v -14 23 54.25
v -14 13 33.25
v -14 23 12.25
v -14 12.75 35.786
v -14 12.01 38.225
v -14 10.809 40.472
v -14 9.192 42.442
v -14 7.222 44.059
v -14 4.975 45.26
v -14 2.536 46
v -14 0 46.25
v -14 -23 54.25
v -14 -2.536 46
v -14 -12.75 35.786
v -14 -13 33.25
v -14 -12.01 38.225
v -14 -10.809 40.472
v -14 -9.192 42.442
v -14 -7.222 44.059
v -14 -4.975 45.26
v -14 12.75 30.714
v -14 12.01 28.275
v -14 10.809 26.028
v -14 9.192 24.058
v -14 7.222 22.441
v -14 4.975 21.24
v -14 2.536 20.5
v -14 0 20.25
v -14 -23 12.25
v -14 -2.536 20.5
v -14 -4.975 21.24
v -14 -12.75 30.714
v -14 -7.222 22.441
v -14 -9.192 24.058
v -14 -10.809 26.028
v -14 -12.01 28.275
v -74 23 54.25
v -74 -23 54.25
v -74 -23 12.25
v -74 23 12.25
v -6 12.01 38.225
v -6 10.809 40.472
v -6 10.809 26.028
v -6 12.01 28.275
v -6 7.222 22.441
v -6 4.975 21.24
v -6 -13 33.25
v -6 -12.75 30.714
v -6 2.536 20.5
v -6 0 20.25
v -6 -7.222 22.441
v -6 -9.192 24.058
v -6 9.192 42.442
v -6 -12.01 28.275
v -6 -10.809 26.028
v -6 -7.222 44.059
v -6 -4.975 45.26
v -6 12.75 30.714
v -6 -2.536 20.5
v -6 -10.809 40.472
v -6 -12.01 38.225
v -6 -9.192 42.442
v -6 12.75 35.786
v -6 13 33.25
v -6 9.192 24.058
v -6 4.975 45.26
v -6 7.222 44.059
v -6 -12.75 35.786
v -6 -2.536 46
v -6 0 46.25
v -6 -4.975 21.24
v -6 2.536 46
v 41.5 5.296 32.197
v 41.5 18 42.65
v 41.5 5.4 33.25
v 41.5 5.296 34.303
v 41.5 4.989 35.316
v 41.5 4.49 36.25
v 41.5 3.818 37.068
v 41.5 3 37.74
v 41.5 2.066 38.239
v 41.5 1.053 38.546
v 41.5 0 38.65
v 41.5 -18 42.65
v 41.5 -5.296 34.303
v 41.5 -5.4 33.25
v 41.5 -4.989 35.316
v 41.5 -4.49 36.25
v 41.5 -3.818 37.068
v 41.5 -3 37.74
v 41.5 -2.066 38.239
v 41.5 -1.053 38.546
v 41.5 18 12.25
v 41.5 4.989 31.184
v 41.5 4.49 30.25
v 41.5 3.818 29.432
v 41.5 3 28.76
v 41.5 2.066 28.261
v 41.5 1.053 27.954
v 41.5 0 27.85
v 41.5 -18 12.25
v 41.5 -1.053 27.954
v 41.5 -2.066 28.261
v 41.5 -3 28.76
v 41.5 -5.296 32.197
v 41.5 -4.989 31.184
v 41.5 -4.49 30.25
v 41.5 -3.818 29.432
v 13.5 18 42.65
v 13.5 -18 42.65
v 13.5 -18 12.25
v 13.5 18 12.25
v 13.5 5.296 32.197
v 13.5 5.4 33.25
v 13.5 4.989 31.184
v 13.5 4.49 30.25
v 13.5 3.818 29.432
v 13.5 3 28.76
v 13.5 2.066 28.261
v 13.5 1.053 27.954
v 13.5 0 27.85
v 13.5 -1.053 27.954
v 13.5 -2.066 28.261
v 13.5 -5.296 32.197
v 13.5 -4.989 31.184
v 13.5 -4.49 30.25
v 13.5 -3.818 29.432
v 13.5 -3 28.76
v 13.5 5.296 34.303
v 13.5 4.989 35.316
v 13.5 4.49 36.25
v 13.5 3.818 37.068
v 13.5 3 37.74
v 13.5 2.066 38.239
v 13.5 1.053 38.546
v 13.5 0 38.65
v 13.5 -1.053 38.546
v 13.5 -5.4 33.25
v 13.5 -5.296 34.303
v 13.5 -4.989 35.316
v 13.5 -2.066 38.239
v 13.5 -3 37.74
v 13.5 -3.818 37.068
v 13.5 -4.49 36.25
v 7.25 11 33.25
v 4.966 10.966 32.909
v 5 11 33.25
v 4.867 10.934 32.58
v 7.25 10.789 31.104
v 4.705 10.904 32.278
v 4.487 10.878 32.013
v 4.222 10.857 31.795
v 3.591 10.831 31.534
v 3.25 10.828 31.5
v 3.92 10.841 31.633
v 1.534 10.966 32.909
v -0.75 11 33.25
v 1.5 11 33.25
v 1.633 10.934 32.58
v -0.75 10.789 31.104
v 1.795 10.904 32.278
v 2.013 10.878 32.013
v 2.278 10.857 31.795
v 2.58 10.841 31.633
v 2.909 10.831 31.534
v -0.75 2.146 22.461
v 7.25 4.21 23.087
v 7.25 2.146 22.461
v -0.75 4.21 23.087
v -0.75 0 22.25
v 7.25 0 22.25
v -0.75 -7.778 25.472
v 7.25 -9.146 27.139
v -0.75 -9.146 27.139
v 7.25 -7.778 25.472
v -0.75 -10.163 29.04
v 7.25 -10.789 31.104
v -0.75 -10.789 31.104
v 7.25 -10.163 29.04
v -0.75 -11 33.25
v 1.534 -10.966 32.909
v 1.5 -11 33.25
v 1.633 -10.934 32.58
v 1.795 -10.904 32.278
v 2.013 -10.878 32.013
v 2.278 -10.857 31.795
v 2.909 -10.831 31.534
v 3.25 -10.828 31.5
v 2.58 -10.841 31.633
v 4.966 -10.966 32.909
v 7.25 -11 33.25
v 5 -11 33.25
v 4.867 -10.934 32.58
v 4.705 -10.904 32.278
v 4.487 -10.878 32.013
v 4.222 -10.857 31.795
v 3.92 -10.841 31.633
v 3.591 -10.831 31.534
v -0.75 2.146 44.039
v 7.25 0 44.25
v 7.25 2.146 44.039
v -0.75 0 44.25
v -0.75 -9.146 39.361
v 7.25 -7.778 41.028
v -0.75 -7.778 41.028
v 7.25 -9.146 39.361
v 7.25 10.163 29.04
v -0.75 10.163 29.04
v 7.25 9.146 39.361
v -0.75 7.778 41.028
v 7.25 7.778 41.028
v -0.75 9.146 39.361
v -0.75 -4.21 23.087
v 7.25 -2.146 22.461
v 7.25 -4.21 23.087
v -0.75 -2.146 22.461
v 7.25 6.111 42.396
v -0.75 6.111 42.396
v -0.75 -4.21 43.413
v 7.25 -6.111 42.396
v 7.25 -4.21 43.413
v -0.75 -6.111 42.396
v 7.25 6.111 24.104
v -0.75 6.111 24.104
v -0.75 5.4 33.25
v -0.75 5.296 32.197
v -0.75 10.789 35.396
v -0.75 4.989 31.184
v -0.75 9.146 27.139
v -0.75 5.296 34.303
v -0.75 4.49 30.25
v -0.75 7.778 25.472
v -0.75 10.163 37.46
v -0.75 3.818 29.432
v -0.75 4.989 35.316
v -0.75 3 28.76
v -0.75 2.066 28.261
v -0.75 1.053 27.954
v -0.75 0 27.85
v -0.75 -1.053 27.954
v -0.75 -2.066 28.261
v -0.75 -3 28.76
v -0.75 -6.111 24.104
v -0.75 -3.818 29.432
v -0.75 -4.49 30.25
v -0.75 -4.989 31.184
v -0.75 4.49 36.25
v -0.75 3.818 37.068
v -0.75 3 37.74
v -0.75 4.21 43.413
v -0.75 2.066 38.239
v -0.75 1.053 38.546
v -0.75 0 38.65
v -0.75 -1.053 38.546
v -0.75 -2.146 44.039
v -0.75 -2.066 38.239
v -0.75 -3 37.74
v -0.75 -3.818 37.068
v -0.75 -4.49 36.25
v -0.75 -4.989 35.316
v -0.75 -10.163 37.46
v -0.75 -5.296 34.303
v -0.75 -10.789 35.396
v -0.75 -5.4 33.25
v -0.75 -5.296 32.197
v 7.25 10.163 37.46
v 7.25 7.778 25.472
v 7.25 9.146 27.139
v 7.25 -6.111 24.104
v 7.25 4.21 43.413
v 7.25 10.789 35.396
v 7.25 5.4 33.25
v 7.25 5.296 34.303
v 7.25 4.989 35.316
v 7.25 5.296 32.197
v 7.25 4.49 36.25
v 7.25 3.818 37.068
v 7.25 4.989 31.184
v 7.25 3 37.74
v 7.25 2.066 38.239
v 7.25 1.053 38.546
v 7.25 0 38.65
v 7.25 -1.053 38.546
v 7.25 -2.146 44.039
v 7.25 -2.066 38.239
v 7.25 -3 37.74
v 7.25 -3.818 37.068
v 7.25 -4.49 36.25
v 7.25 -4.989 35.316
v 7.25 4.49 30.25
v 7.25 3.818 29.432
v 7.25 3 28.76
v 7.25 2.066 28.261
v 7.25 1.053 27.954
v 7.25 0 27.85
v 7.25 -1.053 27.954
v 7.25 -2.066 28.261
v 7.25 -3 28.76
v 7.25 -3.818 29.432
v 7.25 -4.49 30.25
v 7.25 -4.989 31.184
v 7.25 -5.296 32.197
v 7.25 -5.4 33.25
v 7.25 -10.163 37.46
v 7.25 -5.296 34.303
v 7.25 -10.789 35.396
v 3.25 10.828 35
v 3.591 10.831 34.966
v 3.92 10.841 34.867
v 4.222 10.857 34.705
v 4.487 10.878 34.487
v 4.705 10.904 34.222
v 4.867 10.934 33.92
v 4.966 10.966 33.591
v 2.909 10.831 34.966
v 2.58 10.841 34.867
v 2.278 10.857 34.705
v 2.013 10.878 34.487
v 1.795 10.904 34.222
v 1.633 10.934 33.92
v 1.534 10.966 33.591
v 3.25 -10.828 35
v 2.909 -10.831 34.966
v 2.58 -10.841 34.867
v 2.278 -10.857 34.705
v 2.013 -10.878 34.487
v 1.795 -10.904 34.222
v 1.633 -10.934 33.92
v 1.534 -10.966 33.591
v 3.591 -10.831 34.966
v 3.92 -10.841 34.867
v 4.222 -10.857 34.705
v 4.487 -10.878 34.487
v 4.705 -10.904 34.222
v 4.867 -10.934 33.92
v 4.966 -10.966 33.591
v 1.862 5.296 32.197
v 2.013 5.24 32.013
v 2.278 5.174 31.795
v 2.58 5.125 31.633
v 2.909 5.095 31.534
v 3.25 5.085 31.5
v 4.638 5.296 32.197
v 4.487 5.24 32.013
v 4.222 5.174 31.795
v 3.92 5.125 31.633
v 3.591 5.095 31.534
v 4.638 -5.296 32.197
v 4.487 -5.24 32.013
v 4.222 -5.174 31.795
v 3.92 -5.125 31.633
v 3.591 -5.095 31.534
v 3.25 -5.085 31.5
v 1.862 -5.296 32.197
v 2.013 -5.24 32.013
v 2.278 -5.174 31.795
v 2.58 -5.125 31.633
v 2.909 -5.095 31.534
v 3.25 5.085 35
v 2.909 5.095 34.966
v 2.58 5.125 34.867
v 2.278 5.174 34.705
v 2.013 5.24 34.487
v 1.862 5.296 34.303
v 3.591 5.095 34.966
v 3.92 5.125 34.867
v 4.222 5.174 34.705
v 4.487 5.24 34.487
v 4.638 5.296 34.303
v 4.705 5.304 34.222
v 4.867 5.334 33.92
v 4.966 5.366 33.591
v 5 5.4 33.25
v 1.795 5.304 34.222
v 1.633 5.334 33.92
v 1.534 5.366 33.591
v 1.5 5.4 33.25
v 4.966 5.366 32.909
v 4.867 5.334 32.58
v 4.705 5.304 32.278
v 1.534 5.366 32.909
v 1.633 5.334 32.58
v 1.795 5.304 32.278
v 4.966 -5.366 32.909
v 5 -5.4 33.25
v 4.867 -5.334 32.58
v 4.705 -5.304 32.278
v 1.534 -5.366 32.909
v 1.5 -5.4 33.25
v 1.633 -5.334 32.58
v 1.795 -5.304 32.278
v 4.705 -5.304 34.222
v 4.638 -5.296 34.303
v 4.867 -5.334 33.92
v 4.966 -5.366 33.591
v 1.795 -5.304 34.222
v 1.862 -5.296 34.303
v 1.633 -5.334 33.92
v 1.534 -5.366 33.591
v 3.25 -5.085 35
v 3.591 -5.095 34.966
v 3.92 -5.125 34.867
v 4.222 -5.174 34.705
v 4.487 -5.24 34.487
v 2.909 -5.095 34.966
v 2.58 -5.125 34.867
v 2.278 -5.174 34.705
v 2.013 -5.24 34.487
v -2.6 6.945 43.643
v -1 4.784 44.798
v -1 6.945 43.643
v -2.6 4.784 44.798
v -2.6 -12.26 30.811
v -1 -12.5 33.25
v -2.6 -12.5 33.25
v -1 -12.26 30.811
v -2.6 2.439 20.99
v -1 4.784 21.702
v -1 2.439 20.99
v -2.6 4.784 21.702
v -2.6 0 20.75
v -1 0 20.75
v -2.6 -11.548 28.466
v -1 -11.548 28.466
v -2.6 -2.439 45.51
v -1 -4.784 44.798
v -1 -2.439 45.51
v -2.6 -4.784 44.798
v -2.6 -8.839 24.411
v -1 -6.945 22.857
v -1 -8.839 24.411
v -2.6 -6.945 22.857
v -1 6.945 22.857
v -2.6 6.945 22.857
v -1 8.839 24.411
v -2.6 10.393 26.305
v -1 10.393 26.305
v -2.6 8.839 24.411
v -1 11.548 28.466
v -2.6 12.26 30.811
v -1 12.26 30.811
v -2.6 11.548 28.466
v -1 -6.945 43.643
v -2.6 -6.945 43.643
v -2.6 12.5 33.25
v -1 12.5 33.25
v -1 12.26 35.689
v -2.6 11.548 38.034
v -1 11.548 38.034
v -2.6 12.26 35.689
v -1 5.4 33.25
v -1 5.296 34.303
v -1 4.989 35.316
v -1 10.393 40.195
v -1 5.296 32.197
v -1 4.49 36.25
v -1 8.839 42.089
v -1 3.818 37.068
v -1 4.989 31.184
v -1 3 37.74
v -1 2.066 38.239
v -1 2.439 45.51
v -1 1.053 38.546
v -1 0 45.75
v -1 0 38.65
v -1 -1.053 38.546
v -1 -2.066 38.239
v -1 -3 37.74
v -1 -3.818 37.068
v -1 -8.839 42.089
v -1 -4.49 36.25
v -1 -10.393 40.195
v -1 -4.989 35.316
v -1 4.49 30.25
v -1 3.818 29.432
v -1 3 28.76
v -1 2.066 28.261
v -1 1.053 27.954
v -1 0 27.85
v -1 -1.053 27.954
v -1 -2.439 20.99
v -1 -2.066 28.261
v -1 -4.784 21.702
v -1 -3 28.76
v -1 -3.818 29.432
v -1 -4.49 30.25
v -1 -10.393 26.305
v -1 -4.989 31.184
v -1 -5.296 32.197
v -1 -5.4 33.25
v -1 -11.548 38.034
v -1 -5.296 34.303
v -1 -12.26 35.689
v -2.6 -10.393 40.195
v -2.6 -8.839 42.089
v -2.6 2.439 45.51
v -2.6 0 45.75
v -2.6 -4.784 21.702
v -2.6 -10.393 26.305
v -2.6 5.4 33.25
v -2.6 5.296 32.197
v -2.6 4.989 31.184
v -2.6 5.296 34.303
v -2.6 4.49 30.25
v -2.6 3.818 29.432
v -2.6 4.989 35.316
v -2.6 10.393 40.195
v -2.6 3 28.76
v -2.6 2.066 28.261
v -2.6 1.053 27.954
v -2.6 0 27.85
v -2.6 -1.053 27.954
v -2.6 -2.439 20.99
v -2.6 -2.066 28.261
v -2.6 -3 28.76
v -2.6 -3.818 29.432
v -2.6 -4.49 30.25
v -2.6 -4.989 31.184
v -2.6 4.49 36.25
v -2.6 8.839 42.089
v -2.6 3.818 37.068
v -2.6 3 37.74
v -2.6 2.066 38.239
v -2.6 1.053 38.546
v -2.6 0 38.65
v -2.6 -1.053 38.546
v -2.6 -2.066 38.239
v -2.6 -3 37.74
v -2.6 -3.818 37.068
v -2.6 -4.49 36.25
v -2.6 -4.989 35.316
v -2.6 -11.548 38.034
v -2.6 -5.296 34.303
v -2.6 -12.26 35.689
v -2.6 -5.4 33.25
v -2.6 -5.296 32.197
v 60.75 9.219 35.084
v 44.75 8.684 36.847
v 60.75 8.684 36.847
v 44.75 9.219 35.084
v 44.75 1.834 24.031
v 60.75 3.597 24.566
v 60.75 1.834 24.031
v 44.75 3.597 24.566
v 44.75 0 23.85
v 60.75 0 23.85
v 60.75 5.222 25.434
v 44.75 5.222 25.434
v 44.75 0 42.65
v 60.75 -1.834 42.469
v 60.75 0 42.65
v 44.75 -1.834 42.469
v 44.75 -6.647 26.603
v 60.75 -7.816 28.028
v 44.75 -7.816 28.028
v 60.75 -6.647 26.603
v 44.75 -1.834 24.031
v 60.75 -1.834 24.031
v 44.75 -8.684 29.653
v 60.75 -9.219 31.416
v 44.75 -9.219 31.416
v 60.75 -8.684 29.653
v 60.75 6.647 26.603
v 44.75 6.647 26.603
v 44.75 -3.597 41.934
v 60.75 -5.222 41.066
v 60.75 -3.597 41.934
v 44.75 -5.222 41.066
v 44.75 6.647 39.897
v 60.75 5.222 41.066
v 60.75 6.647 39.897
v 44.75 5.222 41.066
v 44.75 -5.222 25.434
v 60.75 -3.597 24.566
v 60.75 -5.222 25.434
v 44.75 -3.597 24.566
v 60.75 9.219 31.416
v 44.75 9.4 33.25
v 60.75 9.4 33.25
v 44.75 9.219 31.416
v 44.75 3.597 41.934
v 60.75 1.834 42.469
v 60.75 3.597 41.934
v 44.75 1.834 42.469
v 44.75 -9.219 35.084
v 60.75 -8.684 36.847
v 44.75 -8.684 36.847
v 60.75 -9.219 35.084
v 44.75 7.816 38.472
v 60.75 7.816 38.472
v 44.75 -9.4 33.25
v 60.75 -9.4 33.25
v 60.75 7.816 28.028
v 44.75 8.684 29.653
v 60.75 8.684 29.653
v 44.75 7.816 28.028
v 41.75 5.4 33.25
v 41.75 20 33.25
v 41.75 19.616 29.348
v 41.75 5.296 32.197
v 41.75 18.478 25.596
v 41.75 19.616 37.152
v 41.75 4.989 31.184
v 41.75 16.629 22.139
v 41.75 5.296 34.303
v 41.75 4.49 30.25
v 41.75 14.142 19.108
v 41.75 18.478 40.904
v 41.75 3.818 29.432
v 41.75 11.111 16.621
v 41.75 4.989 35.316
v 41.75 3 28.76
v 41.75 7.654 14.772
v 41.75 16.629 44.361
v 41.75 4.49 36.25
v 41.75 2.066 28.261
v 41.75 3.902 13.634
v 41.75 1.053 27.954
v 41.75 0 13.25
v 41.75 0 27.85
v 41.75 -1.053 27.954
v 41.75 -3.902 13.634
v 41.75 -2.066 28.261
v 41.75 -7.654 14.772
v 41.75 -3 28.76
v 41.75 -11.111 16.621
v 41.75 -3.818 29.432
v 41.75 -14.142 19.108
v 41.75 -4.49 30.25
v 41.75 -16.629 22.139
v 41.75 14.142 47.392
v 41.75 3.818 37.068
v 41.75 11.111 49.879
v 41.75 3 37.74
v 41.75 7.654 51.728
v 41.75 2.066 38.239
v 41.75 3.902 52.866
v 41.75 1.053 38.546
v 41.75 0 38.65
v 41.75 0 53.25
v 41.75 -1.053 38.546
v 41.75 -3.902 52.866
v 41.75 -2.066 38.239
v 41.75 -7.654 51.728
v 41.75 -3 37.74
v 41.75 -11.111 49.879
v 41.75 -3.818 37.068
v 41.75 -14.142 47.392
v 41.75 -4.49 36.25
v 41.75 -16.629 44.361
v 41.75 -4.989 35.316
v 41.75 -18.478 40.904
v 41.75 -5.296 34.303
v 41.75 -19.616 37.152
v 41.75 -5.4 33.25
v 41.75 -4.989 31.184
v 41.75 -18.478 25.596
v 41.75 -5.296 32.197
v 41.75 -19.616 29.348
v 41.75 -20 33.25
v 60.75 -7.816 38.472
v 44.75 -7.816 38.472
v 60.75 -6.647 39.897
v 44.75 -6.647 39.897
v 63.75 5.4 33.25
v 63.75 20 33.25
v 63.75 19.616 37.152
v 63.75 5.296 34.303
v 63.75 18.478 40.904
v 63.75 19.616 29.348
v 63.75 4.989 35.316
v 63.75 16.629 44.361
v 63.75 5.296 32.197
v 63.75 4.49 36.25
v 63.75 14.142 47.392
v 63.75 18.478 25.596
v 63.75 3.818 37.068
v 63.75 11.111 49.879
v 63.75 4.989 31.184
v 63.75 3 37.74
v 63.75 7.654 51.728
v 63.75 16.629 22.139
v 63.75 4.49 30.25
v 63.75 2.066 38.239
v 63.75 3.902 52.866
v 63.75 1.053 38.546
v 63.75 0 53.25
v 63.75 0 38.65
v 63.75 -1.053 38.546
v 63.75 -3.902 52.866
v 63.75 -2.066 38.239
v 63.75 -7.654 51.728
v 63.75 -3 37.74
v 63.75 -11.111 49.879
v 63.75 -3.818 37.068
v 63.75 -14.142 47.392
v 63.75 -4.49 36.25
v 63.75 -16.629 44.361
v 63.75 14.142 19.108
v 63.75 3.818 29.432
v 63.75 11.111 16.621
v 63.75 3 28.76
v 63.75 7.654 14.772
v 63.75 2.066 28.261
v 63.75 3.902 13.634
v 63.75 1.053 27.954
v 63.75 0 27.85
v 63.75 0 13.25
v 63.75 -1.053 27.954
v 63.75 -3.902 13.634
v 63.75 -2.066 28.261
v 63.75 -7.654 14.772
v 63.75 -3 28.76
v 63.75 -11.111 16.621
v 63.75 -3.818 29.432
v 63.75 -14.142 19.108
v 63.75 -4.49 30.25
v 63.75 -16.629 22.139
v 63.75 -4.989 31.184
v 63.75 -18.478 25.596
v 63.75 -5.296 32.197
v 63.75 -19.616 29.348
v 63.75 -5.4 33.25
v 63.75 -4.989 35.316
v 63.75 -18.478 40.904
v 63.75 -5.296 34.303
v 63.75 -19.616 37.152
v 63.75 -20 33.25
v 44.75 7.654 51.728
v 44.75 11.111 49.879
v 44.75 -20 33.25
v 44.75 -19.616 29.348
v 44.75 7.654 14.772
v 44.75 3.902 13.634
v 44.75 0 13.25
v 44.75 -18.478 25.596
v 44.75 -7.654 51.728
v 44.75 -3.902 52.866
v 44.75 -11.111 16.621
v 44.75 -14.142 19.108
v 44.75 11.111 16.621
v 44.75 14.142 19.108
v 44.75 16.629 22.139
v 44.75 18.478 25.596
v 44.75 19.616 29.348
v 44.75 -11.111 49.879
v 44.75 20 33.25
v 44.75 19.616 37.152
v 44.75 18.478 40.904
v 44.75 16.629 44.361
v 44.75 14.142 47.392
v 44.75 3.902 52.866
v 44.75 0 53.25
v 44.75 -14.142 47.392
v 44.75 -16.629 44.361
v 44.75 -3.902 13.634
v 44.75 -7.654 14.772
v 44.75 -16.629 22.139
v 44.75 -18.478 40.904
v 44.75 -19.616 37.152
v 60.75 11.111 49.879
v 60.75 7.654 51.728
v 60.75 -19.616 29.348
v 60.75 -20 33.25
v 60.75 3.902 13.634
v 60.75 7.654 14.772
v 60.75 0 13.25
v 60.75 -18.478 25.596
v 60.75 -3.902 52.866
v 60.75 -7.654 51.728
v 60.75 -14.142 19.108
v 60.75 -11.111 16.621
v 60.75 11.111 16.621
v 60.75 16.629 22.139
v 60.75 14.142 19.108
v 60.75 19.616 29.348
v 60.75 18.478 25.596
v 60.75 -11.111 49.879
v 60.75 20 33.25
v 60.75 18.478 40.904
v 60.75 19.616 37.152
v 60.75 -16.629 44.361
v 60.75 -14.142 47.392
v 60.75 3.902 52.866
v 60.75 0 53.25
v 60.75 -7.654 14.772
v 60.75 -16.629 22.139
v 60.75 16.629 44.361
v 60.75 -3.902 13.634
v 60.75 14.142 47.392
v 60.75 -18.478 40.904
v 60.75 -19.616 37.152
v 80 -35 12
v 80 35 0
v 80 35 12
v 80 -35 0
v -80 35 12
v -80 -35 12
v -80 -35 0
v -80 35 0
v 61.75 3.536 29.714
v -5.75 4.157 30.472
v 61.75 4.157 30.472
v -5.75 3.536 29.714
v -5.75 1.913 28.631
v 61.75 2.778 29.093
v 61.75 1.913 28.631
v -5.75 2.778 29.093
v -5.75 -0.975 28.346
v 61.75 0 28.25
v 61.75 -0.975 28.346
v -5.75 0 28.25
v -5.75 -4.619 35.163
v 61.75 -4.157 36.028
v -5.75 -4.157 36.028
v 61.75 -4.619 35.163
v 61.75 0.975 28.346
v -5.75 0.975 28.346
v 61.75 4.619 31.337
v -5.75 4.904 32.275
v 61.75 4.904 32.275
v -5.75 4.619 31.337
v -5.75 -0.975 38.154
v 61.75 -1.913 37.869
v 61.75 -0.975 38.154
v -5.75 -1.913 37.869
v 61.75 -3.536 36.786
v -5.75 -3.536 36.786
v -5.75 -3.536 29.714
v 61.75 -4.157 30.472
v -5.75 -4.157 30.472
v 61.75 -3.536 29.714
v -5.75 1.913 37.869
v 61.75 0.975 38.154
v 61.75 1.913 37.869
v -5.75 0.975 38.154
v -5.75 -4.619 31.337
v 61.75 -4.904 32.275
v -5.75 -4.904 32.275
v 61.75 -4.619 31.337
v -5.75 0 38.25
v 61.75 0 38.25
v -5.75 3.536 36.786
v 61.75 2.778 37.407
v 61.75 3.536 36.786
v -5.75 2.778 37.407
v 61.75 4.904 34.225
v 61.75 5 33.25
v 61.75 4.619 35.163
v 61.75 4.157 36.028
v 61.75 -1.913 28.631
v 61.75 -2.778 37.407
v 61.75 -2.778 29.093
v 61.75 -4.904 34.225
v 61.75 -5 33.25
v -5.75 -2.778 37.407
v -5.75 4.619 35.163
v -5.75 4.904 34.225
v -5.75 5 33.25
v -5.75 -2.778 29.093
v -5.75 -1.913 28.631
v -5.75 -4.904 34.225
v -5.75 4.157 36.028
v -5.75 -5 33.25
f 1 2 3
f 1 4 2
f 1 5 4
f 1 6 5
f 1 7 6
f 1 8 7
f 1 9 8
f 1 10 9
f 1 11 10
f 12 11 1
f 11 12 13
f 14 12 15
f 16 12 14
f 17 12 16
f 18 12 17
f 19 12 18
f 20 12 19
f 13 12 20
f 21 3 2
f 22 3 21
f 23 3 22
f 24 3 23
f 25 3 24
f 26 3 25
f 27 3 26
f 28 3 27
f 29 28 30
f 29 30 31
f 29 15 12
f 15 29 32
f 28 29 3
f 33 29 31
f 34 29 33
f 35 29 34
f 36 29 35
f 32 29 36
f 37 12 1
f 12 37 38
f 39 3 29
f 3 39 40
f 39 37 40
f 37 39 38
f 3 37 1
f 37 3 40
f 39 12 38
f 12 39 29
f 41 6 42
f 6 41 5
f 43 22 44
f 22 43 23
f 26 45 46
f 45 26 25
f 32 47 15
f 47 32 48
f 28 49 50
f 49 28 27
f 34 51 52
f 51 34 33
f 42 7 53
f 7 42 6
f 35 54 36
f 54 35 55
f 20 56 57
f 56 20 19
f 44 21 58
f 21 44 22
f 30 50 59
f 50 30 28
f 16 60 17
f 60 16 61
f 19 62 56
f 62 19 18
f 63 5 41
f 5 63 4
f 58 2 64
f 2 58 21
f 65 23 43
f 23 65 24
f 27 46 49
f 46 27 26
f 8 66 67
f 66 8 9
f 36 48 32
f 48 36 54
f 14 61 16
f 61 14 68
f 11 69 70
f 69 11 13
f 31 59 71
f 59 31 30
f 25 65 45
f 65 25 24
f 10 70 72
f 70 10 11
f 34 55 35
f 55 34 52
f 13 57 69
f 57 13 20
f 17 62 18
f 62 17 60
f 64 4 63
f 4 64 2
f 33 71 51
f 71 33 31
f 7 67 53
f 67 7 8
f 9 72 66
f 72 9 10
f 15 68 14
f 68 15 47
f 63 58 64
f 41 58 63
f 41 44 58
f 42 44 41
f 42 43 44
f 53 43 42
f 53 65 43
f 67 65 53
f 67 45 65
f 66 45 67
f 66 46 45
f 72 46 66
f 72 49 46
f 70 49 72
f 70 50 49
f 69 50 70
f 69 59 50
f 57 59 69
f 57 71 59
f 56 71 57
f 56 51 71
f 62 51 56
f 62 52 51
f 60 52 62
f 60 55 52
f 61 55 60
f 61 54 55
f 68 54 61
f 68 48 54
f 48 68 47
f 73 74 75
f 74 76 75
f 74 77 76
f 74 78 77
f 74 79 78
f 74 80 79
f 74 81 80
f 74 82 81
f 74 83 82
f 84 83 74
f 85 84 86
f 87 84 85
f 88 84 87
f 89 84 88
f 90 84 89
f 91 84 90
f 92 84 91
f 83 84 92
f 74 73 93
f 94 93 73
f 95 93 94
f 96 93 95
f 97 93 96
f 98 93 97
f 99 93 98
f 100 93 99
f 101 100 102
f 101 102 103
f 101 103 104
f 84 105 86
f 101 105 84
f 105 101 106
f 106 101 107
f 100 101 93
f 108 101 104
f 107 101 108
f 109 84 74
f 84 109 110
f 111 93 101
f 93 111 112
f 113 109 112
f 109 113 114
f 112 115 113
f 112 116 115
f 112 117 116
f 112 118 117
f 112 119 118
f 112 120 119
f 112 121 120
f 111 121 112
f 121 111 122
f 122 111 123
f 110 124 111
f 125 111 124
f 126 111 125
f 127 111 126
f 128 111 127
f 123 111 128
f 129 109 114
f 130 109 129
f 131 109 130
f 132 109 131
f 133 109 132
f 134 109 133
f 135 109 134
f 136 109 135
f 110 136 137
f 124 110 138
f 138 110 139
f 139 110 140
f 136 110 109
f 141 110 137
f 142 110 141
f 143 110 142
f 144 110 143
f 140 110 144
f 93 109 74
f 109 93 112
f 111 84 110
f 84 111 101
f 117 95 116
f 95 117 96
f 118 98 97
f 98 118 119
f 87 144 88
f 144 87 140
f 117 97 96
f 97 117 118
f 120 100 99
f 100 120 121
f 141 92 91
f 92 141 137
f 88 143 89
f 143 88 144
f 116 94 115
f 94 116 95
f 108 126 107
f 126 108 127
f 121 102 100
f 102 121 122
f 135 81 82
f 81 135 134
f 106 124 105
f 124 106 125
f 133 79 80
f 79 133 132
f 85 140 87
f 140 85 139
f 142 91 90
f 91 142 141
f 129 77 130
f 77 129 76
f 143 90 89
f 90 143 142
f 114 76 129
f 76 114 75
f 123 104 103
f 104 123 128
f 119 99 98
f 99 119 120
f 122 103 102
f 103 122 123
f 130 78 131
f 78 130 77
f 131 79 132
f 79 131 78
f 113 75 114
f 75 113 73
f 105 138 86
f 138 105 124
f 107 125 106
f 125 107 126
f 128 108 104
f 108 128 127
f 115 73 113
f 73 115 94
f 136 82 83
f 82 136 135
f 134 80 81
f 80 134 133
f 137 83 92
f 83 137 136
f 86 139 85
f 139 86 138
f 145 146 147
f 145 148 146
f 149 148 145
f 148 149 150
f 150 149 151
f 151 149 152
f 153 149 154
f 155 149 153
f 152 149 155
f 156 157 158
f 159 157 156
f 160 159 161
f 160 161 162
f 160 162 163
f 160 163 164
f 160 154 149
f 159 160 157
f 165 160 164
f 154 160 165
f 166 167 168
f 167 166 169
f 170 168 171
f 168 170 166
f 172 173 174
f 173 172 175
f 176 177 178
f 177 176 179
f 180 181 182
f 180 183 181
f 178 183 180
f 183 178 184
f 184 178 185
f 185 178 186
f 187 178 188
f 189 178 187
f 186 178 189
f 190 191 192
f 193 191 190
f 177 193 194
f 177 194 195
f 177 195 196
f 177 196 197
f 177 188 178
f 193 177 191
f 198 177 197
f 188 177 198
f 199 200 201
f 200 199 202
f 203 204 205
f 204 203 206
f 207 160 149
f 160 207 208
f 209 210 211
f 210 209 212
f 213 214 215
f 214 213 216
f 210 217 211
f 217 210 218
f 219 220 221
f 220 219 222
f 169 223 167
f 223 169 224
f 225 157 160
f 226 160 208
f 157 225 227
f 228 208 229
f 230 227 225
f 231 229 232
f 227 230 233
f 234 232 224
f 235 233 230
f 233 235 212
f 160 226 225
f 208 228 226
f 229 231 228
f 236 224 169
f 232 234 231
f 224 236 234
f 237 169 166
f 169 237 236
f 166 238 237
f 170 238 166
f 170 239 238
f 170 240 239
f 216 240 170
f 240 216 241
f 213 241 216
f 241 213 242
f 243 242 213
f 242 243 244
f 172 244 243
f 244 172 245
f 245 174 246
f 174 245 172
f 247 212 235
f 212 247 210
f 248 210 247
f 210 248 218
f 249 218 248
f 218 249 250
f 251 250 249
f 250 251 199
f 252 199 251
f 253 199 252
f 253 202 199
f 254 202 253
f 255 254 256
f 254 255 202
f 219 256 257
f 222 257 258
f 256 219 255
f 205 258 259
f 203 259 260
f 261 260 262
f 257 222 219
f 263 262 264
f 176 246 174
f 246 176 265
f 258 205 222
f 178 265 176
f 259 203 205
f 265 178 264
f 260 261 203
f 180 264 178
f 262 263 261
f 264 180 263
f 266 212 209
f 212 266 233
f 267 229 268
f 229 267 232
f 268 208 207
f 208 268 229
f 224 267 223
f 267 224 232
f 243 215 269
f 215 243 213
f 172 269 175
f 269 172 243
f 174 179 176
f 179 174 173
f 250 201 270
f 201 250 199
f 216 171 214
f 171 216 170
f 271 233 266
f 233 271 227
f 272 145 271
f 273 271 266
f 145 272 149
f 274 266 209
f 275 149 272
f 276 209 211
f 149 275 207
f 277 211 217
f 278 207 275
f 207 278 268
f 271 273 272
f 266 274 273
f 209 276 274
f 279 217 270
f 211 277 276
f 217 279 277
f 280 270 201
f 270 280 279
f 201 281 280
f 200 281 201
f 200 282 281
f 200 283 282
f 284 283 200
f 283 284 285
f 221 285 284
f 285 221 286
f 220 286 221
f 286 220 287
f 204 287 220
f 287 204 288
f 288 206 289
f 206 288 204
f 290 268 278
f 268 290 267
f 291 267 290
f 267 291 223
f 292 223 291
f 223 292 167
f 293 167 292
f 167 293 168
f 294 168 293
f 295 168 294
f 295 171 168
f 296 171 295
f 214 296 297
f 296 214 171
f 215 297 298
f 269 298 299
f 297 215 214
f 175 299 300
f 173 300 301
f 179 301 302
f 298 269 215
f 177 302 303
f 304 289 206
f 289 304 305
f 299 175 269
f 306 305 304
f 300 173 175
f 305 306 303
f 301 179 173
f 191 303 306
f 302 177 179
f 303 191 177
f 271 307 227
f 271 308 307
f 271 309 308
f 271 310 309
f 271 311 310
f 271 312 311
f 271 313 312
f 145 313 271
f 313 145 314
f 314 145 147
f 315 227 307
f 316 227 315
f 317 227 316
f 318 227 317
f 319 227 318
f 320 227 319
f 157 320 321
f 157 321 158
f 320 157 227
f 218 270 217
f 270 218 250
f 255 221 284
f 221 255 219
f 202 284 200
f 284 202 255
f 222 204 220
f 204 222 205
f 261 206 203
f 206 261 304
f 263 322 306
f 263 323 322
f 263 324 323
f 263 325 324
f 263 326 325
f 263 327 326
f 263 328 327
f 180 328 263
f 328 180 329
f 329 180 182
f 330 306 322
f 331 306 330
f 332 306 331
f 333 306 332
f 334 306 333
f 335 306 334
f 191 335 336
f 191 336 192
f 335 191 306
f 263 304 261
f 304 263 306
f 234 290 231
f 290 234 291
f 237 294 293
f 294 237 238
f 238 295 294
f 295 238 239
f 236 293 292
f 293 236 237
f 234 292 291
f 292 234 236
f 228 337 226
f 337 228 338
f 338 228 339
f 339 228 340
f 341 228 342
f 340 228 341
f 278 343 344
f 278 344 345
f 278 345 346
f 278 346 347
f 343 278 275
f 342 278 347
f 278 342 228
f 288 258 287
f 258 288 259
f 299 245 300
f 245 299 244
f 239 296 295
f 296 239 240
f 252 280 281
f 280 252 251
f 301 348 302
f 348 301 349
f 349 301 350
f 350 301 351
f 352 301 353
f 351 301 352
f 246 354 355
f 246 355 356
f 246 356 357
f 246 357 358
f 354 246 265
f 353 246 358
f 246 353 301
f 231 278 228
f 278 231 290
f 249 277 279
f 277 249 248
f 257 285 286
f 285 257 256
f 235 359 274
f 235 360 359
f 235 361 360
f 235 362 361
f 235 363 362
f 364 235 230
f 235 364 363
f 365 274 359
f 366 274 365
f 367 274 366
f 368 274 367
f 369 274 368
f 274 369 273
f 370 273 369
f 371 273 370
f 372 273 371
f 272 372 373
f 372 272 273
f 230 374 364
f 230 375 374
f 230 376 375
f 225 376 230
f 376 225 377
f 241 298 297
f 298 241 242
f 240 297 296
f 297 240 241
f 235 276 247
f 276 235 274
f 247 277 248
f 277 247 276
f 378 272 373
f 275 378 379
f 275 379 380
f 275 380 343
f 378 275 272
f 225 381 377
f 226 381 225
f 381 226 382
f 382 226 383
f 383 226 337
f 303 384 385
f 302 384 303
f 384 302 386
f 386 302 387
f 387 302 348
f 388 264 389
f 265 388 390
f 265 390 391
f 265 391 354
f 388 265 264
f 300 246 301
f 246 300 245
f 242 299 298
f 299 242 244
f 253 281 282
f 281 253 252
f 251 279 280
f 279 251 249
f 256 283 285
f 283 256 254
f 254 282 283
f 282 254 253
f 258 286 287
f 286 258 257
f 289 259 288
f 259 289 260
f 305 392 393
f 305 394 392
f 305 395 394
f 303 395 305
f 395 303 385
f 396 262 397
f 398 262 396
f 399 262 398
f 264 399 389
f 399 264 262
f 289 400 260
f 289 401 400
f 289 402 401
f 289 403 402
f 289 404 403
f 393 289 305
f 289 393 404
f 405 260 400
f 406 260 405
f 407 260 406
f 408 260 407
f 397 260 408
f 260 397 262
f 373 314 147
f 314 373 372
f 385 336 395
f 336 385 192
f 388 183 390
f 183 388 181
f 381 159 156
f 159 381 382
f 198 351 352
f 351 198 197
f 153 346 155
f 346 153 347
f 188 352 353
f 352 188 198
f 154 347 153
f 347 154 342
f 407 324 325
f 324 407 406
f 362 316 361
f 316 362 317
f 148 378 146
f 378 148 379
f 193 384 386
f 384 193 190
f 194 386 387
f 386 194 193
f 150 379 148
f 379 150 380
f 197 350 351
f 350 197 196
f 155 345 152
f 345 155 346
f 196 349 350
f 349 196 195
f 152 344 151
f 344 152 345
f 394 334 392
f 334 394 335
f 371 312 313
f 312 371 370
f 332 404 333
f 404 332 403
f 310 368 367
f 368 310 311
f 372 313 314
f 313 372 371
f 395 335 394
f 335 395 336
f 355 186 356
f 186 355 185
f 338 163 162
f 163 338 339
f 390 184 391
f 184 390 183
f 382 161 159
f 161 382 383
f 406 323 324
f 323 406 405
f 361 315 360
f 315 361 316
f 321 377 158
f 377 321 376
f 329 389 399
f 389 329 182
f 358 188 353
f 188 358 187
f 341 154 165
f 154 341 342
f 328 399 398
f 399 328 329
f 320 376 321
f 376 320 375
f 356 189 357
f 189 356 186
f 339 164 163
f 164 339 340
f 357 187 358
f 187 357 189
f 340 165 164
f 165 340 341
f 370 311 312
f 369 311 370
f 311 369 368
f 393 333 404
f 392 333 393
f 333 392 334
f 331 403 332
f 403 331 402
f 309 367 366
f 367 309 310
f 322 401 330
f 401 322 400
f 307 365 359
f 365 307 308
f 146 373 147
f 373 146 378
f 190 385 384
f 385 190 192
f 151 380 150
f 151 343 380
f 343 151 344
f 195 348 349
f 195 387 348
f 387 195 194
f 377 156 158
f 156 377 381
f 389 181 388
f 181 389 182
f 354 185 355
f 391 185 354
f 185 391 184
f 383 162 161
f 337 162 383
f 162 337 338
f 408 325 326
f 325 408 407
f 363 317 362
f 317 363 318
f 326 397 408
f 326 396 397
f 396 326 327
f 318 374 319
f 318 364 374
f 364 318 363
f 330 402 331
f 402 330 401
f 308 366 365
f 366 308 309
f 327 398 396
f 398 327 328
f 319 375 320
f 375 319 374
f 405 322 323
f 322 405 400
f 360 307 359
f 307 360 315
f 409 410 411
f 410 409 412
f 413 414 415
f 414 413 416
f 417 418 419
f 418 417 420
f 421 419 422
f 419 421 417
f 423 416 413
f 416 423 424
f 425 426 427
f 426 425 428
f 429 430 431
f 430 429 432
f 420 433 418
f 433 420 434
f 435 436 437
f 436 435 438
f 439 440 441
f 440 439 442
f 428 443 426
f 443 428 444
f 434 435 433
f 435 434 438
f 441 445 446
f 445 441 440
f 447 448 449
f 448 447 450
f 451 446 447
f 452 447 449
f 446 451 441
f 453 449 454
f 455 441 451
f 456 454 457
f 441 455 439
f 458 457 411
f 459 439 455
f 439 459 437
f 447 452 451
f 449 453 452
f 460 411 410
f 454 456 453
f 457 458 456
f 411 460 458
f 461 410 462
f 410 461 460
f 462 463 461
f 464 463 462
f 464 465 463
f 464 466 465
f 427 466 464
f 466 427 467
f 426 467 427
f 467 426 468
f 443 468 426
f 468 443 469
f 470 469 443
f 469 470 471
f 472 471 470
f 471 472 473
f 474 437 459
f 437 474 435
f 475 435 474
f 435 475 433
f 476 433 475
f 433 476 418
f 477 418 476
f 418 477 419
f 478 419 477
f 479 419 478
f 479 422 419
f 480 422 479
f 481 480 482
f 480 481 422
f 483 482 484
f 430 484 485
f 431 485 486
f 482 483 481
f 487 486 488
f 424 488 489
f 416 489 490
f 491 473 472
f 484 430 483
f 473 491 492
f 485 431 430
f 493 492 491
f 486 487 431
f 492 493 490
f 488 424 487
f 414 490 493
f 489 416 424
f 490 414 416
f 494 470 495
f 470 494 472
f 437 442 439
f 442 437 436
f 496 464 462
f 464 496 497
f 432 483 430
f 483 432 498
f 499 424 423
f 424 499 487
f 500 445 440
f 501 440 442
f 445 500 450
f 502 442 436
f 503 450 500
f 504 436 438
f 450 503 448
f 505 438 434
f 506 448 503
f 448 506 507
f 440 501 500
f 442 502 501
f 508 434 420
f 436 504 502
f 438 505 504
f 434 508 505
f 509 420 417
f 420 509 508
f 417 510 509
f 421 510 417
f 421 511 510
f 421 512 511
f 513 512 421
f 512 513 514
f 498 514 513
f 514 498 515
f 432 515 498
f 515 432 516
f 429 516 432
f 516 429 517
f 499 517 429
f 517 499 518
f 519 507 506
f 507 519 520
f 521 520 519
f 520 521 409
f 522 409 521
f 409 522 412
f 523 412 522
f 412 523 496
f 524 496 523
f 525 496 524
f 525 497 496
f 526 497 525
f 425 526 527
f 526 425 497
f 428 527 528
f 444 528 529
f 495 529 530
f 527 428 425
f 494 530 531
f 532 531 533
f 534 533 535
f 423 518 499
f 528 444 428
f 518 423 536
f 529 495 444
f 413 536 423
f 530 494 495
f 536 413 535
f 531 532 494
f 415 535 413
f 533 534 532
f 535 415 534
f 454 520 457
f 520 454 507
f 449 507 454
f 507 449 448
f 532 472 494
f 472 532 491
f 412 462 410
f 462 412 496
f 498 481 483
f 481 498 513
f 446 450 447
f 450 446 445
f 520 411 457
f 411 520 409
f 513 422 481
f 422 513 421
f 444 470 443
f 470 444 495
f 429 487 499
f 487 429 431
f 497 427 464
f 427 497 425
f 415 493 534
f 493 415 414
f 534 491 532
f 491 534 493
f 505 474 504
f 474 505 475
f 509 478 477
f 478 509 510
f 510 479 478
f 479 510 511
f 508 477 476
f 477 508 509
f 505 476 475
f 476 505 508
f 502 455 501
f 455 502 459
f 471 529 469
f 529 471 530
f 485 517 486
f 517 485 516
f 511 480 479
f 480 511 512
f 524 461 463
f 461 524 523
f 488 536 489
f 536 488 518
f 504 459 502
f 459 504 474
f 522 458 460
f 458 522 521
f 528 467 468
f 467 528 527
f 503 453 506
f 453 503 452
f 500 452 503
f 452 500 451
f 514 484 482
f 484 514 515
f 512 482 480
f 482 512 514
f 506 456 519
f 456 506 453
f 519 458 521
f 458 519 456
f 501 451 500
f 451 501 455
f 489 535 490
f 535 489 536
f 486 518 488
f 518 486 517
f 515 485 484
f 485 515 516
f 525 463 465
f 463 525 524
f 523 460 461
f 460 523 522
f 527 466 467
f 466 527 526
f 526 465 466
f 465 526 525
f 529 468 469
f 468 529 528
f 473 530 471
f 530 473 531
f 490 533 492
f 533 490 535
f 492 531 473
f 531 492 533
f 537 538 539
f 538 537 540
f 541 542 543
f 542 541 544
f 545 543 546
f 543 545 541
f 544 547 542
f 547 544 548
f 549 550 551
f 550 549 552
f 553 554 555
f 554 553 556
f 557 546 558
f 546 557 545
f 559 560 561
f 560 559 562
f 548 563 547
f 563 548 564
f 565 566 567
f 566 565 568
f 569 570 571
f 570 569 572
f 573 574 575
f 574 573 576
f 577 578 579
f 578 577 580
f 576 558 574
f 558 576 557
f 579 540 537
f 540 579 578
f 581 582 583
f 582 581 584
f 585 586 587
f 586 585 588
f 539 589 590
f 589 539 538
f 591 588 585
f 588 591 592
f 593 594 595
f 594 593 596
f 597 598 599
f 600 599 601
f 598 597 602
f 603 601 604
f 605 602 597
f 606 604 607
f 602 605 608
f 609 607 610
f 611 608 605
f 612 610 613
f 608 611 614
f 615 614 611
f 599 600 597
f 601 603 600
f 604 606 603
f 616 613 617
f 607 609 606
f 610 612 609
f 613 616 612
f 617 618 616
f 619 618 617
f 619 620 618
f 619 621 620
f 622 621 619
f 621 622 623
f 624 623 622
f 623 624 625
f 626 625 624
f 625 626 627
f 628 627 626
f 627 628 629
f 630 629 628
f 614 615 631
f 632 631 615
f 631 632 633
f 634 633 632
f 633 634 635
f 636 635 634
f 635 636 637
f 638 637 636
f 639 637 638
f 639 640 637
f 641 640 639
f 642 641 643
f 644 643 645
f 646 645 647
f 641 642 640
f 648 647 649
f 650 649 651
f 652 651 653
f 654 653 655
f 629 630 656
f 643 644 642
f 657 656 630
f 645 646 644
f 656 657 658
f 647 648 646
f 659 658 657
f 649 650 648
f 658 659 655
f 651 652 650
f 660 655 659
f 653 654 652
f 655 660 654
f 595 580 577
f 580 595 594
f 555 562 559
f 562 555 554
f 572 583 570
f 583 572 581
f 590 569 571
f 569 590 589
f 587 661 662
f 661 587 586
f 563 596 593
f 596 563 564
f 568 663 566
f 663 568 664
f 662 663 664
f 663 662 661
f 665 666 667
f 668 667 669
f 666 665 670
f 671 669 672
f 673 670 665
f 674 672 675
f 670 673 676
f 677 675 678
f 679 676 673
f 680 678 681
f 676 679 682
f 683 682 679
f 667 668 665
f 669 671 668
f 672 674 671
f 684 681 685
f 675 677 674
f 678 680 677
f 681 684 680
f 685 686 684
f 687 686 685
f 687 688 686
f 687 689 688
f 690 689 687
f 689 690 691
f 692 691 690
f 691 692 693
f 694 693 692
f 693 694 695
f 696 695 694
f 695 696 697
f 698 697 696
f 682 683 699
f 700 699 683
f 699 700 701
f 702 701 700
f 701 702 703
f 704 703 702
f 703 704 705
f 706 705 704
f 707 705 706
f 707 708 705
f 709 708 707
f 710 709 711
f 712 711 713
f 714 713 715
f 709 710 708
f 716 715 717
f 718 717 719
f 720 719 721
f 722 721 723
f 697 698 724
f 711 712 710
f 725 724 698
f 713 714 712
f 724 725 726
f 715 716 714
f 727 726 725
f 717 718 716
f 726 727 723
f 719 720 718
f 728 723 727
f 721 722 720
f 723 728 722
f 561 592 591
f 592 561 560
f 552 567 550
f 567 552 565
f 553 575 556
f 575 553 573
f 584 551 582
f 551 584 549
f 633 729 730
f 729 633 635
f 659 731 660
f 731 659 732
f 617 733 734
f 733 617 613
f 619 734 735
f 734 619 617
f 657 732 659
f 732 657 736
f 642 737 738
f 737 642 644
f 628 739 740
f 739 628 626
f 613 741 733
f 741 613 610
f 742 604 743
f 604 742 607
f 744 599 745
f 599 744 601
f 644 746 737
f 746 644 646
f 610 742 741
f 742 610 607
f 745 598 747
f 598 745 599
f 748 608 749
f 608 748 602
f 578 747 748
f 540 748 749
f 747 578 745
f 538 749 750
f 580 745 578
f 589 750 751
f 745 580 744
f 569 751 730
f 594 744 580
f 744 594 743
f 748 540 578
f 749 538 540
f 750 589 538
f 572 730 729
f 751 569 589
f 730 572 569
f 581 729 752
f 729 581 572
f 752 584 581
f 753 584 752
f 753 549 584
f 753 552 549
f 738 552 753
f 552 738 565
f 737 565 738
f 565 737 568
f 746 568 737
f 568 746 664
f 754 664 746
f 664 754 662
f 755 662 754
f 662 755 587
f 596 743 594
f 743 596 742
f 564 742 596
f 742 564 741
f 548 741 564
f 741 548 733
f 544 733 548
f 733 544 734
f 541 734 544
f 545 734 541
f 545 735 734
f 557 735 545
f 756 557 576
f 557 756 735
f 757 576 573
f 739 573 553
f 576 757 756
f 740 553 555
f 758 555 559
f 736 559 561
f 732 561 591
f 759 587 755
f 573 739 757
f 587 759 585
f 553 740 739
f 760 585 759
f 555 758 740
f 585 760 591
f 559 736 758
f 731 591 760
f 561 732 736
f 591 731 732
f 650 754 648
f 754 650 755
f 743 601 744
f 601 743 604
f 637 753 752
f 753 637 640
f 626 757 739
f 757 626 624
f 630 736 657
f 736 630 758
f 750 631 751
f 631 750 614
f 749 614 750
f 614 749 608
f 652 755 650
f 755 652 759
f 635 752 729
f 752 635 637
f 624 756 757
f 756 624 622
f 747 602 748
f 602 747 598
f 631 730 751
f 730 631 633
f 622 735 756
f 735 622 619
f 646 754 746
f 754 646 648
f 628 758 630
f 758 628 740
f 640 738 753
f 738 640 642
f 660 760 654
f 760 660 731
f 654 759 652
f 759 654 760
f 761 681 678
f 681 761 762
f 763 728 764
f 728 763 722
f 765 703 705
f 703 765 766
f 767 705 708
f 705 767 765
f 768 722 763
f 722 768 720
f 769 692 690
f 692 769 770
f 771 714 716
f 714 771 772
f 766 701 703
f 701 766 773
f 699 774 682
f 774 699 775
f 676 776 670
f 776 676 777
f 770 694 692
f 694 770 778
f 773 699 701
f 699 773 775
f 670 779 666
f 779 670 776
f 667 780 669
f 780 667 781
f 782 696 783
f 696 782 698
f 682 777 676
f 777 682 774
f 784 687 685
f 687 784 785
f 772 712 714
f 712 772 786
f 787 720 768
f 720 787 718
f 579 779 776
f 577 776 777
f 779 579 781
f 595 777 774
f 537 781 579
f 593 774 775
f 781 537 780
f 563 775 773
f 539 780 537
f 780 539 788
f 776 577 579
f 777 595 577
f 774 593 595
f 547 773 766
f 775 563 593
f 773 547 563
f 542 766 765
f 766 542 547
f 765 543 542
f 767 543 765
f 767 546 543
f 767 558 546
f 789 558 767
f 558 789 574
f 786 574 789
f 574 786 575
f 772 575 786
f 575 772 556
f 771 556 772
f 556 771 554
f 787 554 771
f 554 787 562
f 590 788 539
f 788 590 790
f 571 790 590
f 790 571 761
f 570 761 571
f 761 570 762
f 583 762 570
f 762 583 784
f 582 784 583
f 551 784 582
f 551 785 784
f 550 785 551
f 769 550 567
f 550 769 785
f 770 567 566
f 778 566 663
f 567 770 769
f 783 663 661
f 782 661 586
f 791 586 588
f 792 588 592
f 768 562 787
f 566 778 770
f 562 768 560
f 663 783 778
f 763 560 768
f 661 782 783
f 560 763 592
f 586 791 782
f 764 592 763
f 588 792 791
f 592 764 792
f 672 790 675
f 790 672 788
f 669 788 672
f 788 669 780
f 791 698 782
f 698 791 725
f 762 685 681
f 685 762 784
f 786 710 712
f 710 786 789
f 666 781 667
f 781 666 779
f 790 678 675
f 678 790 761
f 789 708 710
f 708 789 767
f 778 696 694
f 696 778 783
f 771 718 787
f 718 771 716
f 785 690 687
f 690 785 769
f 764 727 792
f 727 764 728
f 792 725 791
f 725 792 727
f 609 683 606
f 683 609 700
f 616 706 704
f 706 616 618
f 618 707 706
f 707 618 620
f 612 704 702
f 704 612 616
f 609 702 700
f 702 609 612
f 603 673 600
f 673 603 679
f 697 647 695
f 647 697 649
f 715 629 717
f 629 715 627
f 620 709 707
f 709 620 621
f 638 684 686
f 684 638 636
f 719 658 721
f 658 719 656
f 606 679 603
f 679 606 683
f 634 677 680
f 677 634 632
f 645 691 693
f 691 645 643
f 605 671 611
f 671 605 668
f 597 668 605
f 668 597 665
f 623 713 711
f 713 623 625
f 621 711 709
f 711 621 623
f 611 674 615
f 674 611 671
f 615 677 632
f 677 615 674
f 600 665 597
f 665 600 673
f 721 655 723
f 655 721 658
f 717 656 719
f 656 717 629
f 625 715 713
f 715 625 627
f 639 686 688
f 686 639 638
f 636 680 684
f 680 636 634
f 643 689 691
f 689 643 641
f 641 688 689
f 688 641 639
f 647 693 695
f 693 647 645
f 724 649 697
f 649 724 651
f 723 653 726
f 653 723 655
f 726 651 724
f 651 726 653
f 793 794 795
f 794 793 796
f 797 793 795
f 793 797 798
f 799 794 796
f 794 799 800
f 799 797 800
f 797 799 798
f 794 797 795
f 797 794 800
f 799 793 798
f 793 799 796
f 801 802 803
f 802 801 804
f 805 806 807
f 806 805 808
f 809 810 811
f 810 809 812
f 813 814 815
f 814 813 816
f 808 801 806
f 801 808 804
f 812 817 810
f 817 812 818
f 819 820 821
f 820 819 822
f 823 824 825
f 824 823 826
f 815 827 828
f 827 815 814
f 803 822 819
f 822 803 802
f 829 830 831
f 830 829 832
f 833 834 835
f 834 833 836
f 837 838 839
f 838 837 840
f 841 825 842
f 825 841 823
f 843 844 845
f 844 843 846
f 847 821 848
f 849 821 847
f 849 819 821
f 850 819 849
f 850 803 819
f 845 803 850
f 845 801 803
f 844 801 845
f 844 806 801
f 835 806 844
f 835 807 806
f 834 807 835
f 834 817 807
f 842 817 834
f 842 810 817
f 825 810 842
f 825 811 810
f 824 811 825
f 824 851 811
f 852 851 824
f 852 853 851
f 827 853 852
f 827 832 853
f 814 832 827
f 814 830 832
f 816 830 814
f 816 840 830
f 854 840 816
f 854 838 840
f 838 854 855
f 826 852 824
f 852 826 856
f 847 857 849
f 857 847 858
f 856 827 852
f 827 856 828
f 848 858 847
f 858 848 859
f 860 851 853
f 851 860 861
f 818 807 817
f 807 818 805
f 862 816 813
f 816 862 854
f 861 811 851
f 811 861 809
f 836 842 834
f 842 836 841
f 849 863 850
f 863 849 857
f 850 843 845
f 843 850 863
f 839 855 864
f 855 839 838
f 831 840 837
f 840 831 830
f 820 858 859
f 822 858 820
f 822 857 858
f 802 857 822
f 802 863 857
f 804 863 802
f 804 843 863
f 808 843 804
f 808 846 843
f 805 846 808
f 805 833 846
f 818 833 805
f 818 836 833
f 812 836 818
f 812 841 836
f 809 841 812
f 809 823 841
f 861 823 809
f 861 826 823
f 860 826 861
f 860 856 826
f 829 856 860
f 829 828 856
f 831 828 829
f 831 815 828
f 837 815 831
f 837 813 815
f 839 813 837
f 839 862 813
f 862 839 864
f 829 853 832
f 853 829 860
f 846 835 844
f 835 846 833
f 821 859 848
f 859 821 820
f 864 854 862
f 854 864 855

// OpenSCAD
$fn = 32;

// ------------------------------------------------------------------------
// Motor drive station: motor 60 x 42 mm, shaft d10, pulley d40
// Every part is its own module, assembly() places every instance.
// ------------------------------------------------------------------------

// --- part 1 ---
module station_bed() {
  difference() {
    translate([-80, -35, 0]) cube([160, 70, 12]);
  }
}

// --- part 2 ---
module drive_motor() {
  union() {
    translate([-30, -23, 0]) cube([60, 46, 42]);
    translate([34, 0, 21]) rotate([0, 90, 0]) cylinder(h = 8, d = 26, center = true);
  }
}

// --- part 3 ---
module pillow_block() {
  difference() {
    translate([-14, -18, 0]) cube([28, 36, 30.4]);
    translate([0, 0, 21]) rotate([0, 90, 0]) cylinder(h = 30, d = 10.8, center = true);
  }
}

// --- part 4 ---
module drive_shaft() {
  translate([0, 0, -33.75]) cylinder(h = 67.5, d = 10);
}

// --- part 5 ---
module shaft_collar() {
  difference() {
    cylinder(h = 8, d = 22);
    translate([0, 0, -1]) cylinder(h = 10, d = 10.8);
    translate([0, 0, 4]) rotate([90, 0, 0]) cylinder(h = 24, d = 3.5, center = true);
  }
}

// --- part 6 ---
module collar_washer() {
  difference() {
      translate([0, 0, 0]) cylinder(h = 1.6, d = 25);
      translate([0, 0, -1]) cylinder(h = 3.6, d = 10.8);
    }
}

// --- part 7 ---
module drive_pulley() {
  difference() {
    union() {
      cylinder(h = 22, d = 18.8);
      cylinder(h = 3, d = 40);
      translate([0, 0, 19]) cylinder(h = 3, d = 40);
    }
    translate([0, 0, -1]) cylinder(h = 24, d = 10.8);
  }
}

// --- assembly ---
module assembly() {
  color([0.80, 0.24, 0.20]) translate([0, 0, 0]) rotate([0, 0, 0]) station_bed();
  color([0.20, 0.45, 0.75]) translate([-44, 0, 12.25]) rotate([0, 0, 0]) drive_motor();
  color([0.25, 0.62, 0.32]) translate([27.5, 0, 12.25]) rotate([0, 0, 0]) pillow_block();
  color([0.92, 0.70, 0.18]) translate([28, 0, 33.25]) rotate([0, 90, 0]) drive_shaft();
  color([0.58, 0.35, 0.70]) translate([-0.75, 0, 33.25]) rotate([0, 90, 0]) shaft_collar();
  color([0.16, 0.66, 0.66]) translate([-2.6, 0, 33.25]) rotate([0, 90, 0]) collar_washer();
  color([0.85, 0.48, 0.18]) translate([41.75, 0, 33.25]) rotate([0, 90, 0]) drive_pulley();
}

assembly();
